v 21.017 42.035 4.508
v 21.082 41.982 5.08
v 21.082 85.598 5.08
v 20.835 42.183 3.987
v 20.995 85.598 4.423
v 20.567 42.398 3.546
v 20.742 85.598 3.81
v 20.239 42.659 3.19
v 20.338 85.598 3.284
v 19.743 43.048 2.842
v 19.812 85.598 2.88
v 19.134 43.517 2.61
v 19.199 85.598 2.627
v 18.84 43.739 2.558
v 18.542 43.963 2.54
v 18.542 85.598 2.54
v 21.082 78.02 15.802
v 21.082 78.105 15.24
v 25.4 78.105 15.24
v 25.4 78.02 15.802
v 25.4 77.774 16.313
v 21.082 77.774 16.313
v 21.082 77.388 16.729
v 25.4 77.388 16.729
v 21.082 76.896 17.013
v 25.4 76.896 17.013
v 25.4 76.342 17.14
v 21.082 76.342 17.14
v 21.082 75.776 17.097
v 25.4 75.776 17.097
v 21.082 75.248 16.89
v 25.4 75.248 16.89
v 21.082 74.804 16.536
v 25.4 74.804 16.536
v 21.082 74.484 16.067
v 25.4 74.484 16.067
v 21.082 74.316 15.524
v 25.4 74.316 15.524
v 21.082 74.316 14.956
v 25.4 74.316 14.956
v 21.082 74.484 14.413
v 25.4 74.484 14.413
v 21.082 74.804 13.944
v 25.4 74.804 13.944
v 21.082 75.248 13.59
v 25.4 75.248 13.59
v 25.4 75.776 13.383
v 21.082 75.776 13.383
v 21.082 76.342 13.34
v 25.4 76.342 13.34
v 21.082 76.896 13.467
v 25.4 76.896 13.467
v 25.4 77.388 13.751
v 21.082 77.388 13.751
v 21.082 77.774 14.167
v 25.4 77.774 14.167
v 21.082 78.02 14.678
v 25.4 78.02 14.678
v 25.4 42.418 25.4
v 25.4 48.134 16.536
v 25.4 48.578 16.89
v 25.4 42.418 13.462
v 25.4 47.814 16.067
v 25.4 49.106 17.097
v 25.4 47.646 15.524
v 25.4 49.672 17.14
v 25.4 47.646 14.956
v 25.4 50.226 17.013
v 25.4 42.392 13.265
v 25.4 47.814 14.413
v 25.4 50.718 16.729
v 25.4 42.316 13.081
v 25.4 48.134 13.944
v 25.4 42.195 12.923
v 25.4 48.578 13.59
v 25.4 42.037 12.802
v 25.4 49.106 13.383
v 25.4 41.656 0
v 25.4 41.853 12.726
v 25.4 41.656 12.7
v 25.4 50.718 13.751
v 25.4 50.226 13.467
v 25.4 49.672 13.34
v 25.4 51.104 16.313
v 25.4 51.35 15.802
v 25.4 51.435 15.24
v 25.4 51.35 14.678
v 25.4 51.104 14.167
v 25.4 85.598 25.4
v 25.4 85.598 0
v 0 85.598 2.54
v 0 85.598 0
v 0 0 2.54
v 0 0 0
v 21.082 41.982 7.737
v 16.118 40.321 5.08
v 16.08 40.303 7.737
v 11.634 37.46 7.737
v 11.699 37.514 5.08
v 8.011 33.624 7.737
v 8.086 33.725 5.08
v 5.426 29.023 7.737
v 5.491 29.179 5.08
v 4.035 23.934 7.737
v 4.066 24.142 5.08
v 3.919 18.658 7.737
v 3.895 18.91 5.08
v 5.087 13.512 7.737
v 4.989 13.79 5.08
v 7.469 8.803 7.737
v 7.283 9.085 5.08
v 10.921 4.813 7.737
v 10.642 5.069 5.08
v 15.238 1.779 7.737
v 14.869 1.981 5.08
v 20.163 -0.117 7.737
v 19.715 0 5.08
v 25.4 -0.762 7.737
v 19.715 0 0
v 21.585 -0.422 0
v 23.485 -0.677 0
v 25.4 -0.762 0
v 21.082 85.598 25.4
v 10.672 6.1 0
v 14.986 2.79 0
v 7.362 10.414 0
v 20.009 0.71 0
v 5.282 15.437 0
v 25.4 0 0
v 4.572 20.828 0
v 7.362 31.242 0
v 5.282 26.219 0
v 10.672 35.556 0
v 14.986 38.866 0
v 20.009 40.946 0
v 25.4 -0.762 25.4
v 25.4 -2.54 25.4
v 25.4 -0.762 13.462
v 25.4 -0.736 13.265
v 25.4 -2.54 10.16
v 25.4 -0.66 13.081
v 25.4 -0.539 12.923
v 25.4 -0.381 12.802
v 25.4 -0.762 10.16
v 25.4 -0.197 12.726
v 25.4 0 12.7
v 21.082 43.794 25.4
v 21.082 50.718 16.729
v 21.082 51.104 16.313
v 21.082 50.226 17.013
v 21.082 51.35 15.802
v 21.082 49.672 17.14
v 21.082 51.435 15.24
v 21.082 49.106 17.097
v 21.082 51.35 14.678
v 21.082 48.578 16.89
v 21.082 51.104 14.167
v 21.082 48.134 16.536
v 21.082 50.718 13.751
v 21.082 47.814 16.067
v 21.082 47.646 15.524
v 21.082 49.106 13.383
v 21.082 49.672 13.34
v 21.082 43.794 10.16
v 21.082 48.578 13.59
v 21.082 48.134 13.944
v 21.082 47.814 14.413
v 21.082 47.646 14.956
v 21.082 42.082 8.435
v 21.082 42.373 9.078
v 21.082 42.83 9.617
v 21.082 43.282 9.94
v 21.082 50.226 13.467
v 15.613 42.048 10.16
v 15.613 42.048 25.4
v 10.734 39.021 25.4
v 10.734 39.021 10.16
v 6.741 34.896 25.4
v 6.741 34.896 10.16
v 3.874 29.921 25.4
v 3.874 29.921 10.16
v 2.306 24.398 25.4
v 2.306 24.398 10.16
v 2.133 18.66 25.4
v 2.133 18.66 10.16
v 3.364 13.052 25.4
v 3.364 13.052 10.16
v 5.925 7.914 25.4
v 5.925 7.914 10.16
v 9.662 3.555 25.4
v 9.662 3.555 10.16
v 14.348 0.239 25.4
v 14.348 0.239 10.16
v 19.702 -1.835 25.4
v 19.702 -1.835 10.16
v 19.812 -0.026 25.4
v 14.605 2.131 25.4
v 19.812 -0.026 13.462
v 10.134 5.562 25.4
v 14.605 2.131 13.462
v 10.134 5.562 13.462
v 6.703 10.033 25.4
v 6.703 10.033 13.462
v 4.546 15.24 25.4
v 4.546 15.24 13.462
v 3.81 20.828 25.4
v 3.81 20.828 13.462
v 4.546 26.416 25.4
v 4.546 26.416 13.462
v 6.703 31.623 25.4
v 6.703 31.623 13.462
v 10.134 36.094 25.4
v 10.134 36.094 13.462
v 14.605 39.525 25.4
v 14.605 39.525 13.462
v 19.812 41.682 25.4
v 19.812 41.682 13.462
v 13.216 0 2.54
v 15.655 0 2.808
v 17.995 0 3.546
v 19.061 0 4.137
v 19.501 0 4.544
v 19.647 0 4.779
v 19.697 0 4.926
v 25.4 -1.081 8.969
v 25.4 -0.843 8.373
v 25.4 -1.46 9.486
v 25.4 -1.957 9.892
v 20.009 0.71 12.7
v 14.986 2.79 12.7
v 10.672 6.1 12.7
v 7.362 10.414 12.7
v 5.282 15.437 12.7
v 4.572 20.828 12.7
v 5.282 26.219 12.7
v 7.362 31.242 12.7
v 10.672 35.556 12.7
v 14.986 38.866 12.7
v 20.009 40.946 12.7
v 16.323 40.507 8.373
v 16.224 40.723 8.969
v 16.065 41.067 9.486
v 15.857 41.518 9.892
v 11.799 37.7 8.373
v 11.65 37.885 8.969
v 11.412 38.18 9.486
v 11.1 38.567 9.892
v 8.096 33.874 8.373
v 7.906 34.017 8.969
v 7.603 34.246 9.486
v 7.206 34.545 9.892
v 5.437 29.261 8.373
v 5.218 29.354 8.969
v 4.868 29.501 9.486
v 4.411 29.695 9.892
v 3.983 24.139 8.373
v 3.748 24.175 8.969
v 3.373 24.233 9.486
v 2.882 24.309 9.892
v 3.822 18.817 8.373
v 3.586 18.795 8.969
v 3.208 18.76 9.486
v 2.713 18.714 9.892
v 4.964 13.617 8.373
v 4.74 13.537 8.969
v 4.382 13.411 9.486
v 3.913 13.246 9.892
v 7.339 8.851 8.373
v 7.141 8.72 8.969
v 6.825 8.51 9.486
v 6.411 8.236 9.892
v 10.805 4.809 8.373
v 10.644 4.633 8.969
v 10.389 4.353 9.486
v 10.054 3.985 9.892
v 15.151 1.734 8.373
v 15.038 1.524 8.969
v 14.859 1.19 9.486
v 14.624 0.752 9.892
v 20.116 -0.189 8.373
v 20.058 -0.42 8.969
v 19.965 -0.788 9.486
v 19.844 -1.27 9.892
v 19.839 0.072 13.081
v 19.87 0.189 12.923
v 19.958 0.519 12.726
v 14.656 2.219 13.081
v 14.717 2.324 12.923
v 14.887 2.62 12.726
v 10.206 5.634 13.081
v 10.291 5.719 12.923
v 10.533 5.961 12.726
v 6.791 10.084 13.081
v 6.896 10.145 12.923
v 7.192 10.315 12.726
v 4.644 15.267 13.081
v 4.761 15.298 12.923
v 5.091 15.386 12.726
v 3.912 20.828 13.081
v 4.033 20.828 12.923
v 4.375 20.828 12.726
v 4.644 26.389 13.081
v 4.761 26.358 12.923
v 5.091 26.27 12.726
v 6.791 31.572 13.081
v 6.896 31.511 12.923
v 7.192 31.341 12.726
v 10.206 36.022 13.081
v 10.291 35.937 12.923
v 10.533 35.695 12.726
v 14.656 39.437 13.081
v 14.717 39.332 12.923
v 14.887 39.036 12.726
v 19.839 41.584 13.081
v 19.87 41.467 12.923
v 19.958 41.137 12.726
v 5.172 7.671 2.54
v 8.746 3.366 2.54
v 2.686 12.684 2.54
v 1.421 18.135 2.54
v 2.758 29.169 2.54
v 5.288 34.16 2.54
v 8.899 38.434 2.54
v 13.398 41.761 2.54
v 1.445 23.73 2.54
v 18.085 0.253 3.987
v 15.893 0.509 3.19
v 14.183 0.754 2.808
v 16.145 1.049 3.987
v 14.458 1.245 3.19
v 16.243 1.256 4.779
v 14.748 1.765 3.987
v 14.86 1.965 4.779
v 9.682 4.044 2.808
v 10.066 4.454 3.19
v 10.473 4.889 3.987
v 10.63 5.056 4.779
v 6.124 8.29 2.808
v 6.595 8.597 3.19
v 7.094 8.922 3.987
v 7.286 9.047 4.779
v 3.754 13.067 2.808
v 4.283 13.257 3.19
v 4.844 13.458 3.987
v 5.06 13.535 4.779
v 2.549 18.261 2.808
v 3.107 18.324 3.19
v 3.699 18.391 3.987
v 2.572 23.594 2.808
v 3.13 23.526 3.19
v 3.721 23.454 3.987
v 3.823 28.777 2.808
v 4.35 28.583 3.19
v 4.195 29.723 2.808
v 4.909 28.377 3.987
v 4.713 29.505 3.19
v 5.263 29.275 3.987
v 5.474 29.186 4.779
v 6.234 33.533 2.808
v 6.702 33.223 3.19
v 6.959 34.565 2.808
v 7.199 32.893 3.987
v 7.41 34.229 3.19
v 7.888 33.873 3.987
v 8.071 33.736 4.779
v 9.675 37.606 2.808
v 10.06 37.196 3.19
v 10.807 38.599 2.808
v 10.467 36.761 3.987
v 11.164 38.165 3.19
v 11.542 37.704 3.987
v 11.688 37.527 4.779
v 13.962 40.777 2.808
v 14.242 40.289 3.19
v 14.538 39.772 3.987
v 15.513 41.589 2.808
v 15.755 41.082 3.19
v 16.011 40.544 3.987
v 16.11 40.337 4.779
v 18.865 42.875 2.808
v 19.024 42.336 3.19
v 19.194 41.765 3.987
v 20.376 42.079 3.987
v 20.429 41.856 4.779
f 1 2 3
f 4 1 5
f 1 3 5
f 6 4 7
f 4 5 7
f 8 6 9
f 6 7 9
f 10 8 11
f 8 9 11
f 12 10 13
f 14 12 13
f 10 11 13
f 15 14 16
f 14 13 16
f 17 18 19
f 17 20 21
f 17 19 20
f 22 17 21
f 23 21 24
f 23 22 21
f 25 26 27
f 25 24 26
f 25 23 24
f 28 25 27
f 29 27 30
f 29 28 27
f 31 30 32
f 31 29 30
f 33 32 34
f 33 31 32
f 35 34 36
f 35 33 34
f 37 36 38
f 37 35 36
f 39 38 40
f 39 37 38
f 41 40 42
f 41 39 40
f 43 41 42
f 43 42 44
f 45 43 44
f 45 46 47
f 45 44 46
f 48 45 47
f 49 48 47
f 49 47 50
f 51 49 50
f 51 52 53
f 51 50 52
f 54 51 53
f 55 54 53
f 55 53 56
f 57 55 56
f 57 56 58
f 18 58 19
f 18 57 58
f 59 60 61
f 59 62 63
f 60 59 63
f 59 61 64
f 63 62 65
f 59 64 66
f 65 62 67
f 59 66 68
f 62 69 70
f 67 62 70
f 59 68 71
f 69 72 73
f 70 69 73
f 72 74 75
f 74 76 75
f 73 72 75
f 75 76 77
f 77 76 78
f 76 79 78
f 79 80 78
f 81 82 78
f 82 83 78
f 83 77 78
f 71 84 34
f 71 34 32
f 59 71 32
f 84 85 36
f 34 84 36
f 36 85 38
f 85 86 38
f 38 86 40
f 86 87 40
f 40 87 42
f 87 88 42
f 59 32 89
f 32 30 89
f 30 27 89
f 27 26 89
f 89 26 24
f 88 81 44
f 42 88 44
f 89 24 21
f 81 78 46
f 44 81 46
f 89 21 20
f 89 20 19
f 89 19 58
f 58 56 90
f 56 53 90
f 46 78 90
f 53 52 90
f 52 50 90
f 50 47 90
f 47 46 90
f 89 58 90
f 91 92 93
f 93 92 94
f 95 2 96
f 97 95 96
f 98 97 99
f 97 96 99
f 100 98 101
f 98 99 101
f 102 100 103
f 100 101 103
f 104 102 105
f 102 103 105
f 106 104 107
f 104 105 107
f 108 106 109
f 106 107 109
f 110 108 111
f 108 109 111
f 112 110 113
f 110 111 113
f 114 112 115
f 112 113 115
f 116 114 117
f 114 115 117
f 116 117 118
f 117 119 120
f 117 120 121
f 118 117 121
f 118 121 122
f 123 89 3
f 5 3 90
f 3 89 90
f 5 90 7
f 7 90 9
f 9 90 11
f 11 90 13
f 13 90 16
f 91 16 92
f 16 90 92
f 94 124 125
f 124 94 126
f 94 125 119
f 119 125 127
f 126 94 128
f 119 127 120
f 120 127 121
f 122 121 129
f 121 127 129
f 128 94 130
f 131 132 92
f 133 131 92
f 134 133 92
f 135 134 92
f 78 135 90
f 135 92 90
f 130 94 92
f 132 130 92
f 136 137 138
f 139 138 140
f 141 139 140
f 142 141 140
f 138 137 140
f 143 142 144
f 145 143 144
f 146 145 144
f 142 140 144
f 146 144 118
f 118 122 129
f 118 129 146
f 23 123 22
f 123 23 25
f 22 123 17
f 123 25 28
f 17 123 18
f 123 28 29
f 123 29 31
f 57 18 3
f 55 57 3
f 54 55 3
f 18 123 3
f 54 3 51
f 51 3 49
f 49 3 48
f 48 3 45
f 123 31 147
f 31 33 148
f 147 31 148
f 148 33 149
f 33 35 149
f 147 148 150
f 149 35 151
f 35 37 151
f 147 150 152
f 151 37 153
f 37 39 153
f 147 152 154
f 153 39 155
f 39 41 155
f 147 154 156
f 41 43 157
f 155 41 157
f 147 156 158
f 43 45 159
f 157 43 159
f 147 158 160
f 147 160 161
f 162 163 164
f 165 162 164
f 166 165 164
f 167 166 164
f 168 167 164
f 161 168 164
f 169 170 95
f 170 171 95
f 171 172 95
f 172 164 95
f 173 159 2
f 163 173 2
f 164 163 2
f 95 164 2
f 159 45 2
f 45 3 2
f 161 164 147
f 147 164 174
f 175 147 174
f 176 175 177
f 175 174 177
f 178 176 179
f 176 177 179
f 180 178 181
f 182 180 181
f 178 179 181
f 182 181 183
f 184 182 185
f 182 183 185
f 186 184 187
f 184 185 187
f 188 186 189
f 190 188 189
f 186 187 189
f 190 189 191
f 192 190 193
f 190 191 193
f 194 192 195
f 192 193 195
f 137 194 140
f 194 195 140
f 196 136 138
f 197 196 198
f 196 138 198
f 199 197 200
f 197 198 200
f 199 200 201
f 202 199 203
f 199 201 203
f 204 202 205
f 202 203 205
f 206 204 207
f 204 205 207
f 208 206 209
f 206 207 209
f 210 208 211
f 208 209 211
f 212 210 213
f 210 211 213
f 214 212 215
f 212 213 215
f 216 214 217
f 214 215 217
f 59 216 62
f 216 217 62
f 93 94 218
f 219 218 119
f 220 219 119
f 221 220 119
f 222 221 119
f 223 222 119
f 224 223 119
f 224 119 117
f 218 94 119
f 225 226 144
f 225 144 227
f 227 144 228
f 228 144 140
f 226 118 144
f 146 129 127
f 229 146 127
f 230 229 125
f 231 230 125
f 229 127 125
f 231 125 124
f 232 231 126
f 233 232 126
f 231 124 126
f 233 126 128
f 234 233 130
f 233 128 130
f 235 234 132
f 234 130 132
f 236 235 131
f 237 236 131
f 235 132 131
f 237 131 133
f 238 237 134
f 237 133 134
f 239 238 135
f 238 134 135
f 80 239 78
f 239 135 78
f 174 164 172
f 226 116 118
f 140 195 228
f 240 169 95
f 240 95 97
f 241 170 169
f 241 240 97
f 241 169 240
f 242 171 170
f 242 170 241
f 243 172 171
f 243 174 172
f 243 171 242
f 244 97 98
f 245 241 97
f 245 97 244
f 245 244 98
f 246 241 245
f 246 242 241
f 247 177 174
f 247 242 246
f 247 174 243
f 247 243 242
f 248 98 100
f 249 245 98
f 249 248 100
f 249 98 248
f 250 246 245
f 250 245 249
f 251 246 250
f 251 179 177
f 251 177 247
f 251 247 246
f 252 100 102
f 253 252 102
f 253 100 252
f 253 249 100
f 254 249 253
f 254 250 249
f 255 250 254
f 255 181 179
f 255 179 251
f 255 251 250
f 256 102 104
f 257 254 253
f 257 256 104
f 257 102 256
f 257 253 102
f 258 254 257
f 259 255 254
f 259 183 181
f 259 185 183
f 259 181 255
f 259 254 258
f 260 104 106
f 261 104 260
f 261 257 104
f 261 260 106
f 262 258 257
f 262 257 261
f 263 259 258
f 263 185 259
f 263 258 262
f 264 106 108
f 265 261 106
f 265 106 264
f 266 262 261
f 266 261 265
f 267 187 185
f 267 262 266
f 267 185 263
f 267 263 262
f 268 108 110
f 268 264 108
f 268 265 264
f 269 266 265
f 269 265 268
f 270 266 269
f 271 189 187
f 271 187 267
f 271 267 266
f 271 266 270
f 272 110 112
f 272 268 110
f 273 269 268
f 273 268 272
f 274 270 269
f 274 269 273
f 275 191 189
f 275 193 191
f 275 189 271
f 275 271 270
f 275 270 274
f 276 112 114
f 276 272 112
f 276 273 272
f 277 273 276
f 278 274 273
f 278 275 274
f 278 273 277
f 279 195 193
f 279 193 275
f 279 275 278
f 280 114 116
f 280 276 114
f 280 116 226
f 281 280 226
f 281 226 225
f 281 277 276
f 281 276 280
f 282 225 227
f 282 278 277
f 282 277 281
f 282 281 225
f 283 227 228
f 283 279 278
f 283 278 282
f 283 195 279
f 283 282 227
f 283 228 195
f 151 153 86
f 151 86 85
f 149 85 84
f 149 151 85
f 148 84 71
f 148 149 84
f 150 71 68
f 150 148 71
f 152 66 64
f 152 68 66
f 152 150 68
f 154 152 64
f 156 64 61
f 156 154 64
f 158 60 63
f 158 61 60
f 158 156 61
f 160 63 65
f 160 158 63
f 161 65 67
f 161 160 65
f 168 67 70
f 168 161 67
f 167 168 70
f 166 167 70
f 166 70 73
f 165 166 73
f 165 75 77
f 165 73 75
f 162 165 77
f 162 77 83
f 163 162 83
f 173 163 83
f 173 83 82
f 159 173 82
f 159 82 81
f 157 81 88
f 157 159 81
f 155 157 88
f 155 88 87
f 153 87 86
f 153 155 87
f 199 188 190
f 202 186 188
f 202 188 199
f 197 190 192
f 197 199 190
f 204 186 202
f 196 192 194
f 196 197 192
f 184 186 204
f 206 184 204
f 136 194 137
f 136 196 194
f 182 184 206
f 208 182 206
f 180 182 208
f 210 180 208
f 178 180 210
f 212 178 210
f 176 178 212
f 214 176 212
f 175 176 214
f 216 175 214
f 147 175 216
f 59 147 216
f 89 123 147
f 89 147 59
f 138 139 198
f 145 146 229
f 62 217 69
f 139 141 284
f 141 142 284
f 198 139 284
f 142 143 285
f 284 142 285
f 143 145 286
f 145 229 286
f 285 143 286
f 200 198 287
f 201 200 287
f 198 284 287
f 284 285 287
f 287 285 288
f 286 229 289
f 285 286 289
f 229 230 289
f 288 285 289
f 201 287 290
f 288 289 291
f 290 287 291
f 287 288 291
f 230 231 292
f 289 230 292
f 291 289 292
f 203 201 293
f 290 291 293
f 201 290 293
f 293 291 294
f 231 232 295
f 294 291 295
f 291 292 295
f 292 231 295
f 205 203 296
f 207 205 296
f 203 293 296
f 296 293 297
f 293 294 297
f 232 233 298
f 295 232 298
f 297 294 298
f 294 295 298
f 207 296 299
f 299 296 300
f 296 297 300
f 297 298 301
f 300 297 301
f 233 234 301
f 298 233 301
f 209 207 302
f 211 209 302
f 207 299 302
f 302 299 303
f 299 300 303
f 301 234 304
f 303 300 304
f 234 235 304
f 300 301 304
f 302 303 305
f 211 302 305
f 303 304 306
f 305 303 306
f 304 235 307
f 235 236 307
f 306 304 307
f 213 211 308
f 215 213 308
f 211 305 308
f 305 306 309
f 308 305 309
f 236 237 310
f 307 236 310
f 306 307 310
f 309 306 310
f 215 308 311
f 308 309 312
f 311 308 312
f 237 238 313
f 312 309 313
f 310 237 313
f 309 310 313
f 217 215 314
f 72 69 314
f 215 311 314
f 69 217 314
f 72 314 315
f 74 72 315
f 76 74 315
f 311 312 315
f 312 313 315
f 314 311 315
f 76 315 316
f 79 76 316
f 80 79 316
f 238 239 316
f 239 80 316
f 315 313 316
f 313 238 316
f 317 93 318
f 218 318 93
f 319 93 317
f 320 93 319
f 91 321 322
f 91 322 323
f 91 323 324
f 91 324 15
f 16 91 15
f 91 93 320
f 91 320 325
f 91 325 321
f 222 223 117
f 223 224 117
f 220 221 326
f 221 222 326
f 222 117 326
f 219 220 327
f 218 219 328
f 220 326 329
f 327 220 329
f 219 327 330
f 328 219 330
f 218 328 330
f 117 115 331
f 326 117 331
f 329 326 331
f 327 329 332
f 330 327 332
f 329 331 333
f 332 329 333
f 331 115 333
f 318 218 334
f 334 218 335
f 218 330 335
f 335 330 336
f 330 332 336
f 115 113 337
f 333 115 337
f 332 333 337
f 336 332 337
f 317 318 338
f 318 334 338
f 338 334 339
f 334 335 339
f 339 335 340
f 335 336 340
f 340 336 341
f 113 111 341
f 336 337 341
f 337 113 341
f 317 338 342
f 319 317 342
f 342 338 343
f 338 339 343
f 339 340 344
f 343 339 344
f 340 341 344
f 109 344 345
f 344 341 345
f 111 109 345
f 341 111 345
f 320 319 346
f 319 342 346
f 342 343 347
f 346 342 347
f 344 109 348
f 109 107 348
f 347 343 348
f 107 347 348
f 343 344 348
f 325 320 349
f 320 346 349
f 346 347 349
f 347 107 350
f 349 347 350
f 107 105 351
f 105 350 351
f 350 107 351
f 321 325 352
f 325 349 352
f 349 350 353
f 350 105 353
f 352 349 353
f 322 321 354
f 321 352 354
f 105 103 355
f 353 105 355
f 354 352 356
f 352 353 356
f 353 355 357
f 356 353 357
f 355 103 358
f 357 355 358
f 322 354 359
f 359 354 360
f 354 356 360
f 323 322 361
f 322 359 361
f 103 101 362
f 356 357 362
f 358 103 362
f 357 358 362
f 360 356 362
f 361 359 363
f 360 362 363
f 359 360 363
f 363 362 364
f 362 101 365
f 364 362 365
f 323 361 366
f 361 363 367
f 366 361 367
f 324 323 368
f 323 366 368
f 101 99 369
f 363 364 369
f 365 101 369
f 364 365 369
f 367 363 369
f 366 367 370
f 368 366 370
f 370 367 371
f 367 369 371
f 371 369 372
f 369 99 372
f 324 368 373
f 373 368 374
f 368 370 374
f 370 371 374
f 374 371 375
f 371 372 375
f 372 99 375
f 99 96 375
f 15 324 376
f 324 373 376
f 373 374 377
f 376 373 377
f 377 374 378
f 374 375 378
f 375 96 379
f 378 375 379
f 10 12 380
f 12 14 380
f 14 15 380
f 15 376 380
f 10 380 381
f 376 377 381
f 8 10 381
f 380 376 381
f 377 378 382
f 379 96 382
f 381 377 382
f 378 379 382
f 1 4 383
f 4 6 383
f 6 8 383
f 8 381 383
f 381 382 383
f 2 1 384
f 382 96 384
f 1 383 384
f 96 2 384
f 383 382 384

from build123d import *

# Parameters (mm, degrees)
BOSS_EXTRUDE1_DEPTH     = 2.5399999999999996
BOSS_EXTRUDE3_DEPTH     = 12.7
BOSS_EXTRUDE6_DEPTH     = 2.54
BOSS_EXTRUDE7_DEPTH     = 25.4
BOSS_EXTRUDE8_START     = 10.16
BOSS_EXTRUDE8_DEPTH     = 15.239999999999998
FILLET1_R               = 2.5399999999999996
FILLET2_ANGLE           = 169.351542
FILLET3_R               = 0.762
CUT_EXTRUDE1_DEPTH      = 93.8296161634462
CUT_EXTRUDE1_DEPTH_BACK = 93.8296161634462
SKETCH3_R               = 1.9050000000000038
SKETCH3_R_2             = 1.9049999999999983


with BuildPart() as part:
    # Sketch2 → Boss-Extrude1 (new body)
    with BuildSketch(Plane.XY):
        with BuildLine():
            Line((0, 85.598), (0, 0))
            Line((0, 0), (14.804819963776673, 1e-17))
            ThreePointArc((14.804819963776595, -3.0553e-13), (2.268412192290537, 24.14357981267628), (21.081999999999496, 43.793589476431805))
            Line((21.082000000000004, 43.79358947643172), (21.082, 85.598))
            Line((21.082, 85.598), (0, 85.598))
        make_face()
    extrude(amount=BOSS_EXTRUDE1_DEPTH)



with BuildPart() as body_2:
    # Sketch2<4> → Boss-Extrude3 (new body)
    with BuildSketch(Plane.XY):
        with BuildLine():
            ThreePointArc((21.082000000000008, 41.98179341867554), (3.82144132339004, 21.53078406363614), (19.714710561456986, 2.0606e-13))
            Line((19.714710561456965, 2e-17), (25.399999983196594, 2e-17))
            ThreePointArc((25.399999983196587, -3.55e-15), (4.685437224641706, 18.657176878292418), (21.082000000000004, 41.20348674265231))
            Line((21.082000000000004, 41.20348674265231), (21.082000000000004, 41.98179341867554))
        make_face()
        with BuildLine():
            ThreePointArc((25.400000000000105, 42.418000000000006), (23.230011510307612, 42.30867154338064), (21.082000000000008, 41.98179341867554))
            Line((21.082000000000004, 41.98179341867554), (21.082000000000004, 41.20348674265231))
            ThreePointArc((21.082000000000004, 41.20348674265231), (23.229176869936293, 41.542562774482604), (25.39999999999965, 41.656000000000006))
            Line((25.400000000000002, 41.656000000000006), (25.400000000000002, 42.418000000000006))
        make_face()
        with BuildLine():
            Line((25.399999983196594, 2e-17), (19.714710561456965, 2e-17))
            ThreePointArc((19.714710561456986, 2.0606e-13), (22.531936193178055, -0.5706520603518008), (25.4000000000001, -0.7620000000000076))
            Line((25.40000000000001, -0.7620000000000147), (25.40000000000001, 0))
        make_face()
    extrude(amount=BOSS_EXTRUDE3_DEPTH)


with BuildPart() as part_1:
    add(part.part)

    add(body_2.part)  # Boss-Extrude6 merges body 2
    # Sketch2<9> → Boss-Extrude6 (add)
    with BuildSketch(Plane.XY):
        with BuildLine():
            ThreePointArc((21.081999999999496, 43.793589476431805), (2.268412192290537, 24.14357981267628), (14.804819963776595, -3.0553e-13))
            Line((14.804819963776673, 1e-17), (19.714710561456965, 2e-17))
            ThreePointArc((19.714710561456986, 2.0606e-13), (3.82144132339004, 21.53078406363614), (21.082000000000008, 41.98179341867554))
            Line((21.082000000000004, 41.98179341867554), (21.082000000000004, 43.79358947643172))
        make_face()
    extrude(amount=BOSS_EXTRUDE6_DEPTH)

    # Sketch2<10> → Boss-Extrude7 (add)
    with BuildSketch(Plane.XY):
        with BuildLine():
            Line((25.4, 85.598), (21.082, 85.598))
            Line((21.082, 85.598), (21.082000000000004, 43.79358947643172))
            ThreePointArc((21.081999999999496, 43.793589476431805), (23.231644734511608, 44.095179877299884), (25.39999999999975, 44.196))
            Line((25.400000000000002, 44.196), (25.4, 85.598))
        make_face()
        with BuildLine():
            ThreePointArc((25.39999999999975, 44.196), (23.231644734511608, 44.095179877299884), (21.081999999999496, 43.793589476431805))
            Line((21.082000000000004, 43.79358947643172), (21.082000000000004, 41.98179341867554))
            ThreePointArc((21.082000000000008, 41.98179341867554), (23.230011510307612, 42.30867154338064), (25.400000000000105, 42.418000000000006))
            Line((25.400000000000002, 42.418000000000006), (25.400000000000002, 44.196))
        make_face()
    extrude(amount=BOSS_EXTRUDE7_DEPTH)

    # Sketch2<12> → Boss-Extrude8 (add)
    with BuildSketch(Plane.XY.offset(BOSS_EXTRUDE8_START)):
        with BuildLine():
            Line((19.714710561456965, 2e-17), (14.804819963776673, 1e-17))
            ThreePointArc((14.804819963776595, -3.0553e-13), (19.952306910260432, -1.8961295542866416), (25.400000000000006, -2.539999999999999))
            Line((25.40000000000001, -2.5400000000000063), (25.40000000000001, -0.7620000000000147))
            ThreePointArc((25.4000000000001, -0.7620000000000076), (22.531936193178055, -0.5706520603518008), (19.714710561456986, 2.0606e-13))
        make_face()
        with BuildLine():
            ThreePointArc((21.081999999999496, 43.793589476431805), (2.268412192290537, 24.14357981267628), (14.804819963776595, -3.0553e-13))
            Line((14.804819963776673, 1e-17), (19.714710561456965, 2e-17))
            ThreePointArc((19.714710561456986, 2.0606e-13), (3.82144132339004, 21.53078406363614), (21.082000000000008, 41.98179341867554))
            Line((21.082000000000004, 41.98179341867554), (21.082000000000004, 43.79358947643172))
        make_face()
    extrude(amount=BOSS_EXTRUDE8_DEPTH)

    # Fillet1
    fillet1_edges = [part_1.edges().sort_by_distance(p)[0] for p in [
        (21.082, 63.78989670933777, 2.5399999999999996),
        (3.8214413233900366, 21.530784063636144, 2.54),
    ]]
    fillet(fillet1_edges, radius=FILLET1_R)

    # Fillet2: read off the stored shape, not the designer's step
    # Fillet2 outline → Fillet2 (revolve)
    with BuildSketch(Plane(origin=(25.4, 20.828, 0), x_dir=(-0.1847826086956513, 0.982779419566583, 0), z_dir=(0.982779419566583, 0.1847826086956513, 0))):
        with BuildLine():
            ThreePointArc((21.59, 7.736994428), (22.082186532, 9.239678693), (23.368, 10.16))
            Line((23.368, 10.16), (21.59, 10.16))
            Line((21.59, 10.16), (21.59, 7.736994428))
        make_face()
    revolve(axis=Axis((25.4, 20.828, 0), (0, 0, 1)), revolution_arc=FILLET2_ANGLE)

    # Fillet3
    fillet3_edges = [part_1.edges().sort_by_distance(p)[0] for p in [
        (3.809999999999814, 20.827999999999818, 12.7),
    ]]
    fillet(fillet3_edges, radius=FILLET3_R - 0.0001)  # a hair under: the kernel refuses the full size

    # Sketch3 → Cut-Extrude1 (cut, two sides: drawn at the far end of the back side and taken through both)
    with BuildSketch(Plane(origin=(0, 0, 0), x_dir=(0, 0, -1), z_dir=(1, 0, 0)).offset(-CUT_EXTRUDE1_DEPTH_BACK)):
        with Locations(Location((-15.24, 76.2, 0), (0, 0, 90))):
            Circle(SKETCH3_R)
        with Locations(Location((-15.239999999999998, 49.53, 0), (0, 0, 90))):
            Circle(SKETCH3_R_2)
    extrude(amount=CUT_EXTRUDE1_DEPTH + CUT_EXTRUDE1_DEPTH_BACK, mode=Mode.SUBTRACT)


solid = part_1.part
